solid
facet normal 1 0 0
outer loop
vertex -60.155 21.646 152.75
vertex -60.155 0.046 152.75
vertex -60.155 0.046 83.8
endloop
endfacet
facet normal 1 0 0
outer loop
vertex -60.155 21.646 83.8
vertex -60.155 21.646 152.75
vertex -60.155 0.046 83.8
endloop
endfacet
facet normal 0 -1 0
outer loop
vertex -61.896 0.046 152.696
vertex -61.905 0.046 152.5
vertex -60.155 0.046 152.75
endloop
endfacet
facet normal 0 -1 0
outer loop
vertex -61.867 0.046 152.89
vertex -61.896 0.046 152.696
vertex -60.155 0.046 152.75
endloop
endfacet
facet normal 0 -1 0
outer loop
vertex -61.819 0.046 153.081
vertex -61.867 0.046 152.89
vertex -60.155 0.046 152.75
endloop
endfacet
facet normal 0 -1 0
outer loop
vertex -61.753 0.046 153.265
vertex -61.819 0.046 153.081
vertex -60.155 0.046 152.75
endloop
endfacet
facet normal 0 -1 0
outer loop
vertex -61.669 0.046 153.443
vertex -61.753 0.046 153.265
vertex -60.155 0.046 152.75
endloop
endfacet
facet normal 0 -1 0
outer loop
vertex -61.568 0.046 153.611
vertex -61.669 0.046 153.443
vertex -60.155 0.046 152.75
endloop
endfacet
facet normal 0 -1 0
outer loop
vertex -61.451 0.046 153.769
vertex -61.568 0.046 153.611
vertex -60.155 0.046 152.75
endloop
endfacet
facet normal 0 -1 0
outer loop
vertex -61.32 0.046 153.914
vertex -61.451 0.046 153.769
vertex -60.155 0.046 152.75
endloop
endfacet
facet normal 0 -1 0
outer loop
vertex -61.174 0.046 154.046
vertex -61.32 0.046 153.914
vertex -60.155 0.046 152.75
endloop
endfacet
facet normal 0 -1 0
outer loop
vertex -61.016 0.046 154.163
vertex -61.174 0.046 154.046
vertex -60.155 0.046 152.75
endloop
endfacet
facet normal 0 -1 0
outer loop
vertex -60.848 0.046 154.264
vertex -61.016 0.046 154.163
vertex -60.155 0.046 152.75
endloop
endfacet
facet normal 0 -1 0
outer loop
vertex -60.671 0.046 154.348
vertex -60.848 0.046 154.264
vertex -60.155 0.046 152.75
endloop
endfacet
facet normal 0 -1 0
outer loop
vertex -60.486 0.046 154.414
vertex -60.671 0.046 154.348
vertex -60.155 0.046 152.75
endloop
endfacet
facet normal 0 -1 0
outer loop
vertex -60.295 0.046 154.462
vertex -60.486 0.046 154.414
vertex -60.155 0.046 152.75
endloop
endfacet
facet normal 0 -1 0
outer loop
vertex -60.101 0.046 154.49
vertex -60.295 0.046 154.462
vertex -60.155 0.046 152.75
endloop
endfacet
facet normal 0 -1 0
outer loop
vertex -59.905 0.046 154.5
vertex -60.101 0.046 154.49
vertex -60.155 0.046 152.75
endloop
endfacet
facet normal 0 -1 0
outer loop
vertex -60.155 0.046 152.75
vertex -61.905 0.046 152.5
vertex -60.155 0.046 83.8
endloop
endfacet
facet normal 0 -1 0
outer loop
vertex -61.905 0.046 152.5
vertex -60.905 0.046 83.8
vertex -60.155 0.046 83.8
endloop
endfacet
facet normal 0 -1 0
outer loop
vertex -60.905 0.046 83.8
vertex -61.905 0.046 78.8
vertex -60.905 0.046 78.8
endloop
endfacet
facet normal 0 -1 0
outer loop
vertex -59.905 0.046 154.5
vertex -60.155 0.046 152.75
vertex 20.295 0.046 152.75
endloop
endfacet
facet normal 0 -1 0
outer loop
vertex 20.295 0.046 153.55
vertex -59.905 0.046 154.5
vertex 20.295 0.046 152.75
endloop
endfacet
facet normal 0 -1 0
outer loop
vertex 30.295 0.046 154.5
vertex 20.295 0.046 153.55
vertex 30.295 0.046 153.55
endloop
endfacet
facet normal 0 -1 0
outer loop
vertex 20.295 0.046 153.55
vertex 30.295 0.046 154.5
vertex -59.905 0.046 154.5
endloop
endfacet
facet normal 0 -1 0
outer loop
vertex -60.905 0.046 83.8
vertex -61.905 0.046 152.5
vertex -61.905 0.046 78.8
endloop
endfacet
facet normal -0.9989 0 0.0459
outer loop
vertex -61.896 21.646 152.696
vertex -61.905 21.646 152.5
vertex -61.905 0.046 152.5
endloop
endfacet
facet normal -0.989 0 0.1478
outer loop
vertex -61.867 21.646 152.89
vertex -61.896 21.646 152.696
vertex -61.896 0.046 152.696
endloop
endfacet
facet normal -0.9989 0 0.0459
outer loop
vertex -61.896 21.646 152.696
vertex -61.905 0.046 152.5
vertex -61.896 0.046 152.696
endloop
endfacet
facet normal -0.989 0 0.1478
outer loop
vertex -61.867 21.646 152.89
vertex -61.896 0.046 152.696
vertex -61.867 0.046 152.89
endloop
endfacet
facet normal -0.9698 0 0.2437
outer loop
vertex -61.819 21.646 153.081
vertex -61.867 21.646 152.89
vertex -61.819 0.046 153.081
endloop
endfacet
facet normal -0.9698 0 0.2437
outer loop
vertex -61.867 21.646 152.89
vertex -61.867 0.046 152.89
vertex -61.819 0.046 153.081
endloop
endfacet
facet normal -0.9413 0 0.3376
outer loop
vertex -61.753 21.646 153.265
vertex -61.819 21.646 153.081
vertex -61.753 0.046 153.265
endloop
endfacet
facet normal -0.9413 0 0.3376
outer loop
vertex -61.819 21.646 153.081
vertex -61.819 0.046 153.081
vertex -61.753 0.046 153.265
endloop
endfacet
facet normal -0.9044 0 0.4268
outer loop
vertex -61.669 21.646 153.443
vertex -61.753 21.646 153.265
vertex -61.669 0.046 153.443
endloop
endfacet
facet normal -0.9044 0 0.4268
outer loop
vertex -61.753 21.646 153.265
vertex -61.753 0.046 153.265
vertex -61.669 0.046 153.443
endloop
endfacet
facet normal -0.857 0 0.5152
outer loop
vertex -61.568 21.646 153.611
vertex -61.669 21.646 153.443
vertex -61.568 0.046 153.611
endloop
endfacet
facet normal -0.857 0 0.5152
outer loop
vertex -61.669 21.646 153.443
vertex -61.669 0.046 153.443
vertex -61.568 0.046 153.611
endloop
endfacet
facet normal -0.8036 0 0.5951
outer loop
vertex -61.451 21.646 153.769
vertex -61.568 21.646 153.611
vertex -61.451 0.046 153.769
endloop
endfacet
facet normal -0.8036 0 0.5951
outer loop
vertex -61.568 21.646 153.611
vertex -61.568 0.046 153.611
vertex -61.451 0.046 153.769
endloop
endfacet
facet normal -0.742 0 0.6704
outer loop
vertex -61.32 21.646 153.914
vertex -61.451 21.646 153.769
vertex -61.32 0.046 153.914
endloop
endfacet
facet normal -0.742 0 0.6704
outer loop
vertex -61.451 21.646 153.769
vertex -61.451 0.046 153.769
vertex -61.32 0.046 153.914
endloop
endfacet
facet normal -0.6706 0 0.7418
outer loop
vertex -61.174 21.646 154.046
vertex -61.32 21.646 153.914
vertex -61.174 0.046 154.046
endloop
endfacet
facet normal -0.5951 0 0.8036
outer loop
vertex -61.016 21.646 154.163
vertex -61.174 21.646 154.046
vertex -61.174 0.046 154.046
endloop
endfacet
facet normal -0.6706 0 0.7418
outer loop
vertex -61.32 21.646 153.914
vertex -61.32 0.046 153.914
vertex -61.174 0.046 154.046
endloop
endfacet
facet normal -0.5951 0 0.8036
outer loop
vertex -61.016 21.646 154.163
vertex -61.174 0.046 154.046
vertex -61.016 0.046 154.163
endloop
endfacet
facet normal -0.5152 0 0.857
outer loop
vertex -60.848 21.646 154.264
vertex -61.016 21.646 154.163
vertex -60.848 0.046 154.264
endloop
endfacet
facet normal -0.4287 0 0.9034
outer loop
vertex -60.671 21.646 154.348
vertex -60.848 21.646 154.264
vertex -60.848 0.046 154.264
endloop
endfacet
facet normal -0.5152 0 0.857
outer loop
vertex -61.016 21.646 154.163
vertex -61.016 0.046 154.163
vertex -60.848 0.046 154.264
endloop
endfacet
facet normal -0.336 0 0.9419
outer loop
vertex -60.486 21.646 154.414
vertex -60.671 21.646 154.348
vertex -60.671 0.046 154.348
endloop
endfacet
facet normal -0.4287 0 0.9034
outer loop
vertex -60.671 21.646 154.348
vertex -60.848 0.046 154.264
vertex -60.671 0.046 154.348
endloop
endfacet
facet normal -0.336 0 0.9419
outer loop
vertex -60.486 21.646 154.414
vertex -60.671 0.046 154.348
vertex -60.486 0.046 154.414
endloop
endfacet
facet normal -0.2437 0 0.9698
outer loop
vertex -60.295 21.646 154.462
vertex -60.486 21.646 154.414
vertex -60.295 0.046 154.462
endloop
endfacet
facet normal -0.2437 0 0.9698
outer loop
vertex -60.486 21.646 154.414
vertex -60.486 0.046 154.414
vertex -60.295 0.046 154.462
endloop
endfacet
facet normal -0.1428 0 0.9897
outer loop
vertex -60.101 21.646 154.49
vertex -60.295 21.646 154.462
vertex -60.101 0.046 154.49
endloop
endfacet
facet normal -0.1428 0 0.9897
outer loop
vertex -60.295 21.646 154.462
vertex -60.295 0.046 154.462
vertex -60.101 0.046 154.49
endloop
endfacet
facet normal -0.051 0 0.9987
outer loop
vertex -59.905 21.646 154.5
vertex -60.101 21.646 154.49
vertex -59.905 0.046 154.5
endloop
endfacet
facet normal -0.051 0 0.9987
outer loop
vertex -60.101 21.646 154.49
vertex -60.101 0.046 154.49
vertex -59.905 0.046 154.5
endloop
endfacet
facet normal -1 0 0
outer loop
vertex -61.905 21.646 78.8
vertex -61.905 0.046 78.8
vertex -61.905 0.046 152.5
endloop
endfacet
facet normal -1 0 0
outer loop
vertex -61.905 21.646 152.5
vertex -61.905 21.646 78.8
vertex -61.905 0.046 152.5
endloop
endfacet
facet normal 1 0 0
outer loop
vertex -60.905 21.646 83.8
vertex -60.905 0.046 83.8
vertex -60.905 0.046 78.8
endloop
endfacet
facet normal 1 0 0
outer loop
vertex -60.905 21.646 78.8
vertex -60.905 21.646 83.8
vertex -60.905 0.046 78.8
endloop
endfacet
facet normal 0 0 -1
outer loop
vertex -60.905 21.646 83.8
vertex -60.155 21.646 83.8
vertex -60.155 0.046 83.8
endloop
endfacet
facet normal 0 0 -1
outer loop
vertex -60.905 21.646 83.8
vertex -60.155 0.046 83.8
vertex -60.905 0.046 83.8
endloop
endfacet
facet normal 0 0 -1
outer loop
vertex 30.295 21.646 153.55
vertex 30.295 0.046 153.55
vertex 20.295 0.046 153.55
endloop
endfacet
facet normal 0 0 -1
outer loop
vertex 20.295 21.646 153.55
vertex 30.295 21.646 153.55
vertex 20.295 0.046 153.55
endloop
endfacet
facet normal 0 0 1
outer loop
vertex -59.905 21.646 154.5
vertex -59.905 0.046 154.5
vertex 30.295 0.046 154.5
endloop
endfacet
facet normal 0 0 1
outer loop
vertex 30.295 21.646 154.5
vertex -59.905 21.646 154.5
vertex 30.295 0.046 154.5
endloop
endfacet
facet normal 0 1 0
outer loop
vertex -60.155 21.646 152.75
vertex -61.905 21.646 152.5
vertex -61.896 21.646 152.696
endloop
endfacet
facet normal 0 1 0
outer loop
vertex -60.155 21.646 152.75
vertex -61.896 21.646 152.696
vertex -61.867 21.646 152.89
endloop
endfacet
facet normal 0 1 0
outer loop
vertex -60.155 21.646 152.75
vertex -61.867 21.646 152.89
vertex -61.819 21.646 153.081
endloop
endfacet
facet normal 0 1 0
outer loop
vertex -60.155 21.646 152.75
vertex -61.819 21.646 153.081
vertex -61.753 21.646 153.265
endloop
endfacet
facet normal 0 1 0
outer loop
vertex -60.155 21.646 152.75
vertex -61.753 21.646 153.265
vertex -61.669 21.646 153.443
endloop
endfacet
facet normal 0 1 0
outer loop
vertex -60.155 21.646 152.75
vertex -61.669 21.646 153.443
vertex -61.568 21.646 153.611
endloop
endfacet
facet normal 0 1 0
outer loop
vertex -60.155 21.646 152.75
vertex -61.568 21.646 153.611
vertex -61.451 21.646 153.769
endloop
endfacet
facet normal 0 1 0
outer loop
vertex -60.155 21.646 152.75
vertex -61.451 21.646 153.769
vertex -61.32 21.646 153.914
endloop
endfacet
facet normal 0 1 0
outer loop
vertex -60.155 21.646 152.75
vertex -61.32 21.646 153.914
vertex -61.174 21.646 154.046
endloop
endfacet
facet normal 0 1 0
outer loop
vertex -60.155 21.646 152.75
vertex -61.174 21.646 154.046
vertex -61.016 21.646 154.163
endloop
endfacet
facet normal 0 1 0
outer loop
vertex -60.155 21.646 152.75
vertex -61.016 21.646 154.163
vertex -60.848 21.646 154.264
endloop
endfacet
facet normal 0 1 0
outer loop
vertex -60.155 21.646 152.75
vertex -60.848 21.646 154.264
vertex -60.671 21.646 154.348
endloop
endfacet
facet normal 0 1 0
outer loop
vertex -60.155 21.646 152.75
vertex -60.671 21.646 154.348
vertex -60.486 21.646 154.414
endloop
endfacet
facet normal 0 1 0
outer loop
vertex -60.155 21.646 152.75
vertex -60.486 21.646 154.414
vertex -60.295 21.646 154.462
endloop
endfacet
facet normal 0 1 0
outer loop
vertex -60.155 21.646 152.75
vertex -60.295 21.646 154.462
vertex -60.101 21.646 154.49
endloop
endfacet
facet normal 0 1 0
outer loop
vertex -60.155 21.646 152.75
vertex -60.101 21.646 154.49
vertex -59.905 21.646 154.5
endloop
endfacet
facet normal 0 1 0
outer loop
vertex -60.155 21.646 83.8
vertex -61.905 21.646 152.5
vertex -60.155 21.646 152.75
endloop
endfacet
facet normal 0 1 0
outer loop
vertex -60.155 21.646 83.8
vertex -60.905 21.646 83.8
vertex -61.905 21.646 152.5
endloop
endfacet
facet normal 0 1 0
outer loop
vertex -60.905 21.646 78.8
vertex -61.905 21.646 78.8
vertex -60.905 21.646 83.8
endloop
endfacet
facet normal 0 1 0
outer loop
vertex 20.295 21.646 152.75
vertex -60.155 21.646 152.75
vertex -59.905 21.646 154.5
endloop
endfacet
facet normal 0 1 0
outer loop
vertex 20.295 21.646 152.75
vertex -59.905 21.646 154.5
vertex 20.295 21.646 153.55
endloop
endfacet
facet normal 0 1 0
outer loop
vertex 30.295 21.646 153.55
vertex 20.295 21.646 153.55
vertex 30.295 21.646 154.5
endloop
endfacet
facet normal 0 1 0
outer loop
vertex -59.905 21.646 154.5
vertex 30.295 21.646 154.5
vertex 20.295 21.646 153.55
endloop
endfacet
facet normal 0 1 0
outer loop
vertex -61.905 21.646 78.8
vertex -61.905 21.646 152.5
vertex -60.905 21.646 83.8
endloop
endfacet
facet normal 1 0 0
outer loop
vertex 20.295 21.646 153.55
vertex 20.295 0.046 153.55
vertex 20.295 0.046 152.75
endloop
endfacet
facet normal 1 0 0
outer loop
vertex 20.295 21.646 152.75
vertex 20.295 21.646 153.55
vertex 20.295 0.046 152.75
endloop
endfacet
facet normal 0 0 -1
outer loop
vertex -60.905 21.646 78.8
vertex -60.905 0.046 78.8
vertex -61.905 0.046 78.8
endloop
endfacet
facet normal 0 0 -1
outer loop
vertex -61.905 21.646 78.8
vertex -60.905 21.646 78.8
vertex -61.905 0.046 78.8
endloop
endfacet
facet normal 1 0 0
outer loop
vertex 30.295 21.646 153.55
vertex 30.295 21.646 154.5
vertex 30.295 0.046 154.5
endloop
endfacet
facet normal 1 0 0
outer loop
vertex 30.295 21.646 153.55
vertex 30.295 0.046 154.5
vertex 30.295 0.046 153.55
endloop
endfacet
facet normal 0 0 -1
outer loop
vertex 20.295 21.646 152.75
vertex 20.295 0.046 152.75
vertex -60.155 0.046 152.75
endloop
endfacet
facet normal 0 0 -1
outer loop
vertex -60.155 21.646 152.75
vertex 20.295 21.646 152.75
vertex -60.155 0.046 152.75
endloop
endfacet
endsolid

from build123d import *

# Parameters (mm, degrees)
SALIENTE_EXTRUIR1_START = 0.2
SALIENTE_EXTRUIR1_DEPTH = 21.6


with BuildPart() as part:
    # Croquis1 → Saliente-Extruir1 (new body)
    with BuildSketch(Plane(origin=(0, -0.153950711, 0), x_dir=(1, 0, 0), z_dir=(0, 1, 0)).offset(SALIENTE_EXTRUIR1_START)):
        with BuildLine():
            Line((-59.905314299, -154.5), (30.294685701, -154.5))
            Line((30.294685701, -154.5), (30.294685701, -153.55))
            Line((30.294685701, -153.55), (20.294685701, -153.55))
            Line((20.294685701, -153.55), (20.294685701, -152.75))
            Line((20.294685701, -152.75), (-60.155314299, -152.75))
            Line((-60.155314299, -152.75), (-60.155314299, -83.8))
            Line((-60.155314299, -83.8), (-60.905314299, -83.8))
            Line((-60.905314299, -83.8), (-60.905314299, -78.8))
            Line((-60.905314299, -78.8), (-61.905314299, -78.8))
            Line((-61.905314299, -78.8), (-61.905314299, -152.5))
            ThreePointArc((-61.905314299, -152.5), (-61.319527861, -153.914213562), (-59.905314299, -154.5))
        make_face()
    extrude(amount=SALIENTE_EXTRUIR1_DEPTH)


solid = part.part
